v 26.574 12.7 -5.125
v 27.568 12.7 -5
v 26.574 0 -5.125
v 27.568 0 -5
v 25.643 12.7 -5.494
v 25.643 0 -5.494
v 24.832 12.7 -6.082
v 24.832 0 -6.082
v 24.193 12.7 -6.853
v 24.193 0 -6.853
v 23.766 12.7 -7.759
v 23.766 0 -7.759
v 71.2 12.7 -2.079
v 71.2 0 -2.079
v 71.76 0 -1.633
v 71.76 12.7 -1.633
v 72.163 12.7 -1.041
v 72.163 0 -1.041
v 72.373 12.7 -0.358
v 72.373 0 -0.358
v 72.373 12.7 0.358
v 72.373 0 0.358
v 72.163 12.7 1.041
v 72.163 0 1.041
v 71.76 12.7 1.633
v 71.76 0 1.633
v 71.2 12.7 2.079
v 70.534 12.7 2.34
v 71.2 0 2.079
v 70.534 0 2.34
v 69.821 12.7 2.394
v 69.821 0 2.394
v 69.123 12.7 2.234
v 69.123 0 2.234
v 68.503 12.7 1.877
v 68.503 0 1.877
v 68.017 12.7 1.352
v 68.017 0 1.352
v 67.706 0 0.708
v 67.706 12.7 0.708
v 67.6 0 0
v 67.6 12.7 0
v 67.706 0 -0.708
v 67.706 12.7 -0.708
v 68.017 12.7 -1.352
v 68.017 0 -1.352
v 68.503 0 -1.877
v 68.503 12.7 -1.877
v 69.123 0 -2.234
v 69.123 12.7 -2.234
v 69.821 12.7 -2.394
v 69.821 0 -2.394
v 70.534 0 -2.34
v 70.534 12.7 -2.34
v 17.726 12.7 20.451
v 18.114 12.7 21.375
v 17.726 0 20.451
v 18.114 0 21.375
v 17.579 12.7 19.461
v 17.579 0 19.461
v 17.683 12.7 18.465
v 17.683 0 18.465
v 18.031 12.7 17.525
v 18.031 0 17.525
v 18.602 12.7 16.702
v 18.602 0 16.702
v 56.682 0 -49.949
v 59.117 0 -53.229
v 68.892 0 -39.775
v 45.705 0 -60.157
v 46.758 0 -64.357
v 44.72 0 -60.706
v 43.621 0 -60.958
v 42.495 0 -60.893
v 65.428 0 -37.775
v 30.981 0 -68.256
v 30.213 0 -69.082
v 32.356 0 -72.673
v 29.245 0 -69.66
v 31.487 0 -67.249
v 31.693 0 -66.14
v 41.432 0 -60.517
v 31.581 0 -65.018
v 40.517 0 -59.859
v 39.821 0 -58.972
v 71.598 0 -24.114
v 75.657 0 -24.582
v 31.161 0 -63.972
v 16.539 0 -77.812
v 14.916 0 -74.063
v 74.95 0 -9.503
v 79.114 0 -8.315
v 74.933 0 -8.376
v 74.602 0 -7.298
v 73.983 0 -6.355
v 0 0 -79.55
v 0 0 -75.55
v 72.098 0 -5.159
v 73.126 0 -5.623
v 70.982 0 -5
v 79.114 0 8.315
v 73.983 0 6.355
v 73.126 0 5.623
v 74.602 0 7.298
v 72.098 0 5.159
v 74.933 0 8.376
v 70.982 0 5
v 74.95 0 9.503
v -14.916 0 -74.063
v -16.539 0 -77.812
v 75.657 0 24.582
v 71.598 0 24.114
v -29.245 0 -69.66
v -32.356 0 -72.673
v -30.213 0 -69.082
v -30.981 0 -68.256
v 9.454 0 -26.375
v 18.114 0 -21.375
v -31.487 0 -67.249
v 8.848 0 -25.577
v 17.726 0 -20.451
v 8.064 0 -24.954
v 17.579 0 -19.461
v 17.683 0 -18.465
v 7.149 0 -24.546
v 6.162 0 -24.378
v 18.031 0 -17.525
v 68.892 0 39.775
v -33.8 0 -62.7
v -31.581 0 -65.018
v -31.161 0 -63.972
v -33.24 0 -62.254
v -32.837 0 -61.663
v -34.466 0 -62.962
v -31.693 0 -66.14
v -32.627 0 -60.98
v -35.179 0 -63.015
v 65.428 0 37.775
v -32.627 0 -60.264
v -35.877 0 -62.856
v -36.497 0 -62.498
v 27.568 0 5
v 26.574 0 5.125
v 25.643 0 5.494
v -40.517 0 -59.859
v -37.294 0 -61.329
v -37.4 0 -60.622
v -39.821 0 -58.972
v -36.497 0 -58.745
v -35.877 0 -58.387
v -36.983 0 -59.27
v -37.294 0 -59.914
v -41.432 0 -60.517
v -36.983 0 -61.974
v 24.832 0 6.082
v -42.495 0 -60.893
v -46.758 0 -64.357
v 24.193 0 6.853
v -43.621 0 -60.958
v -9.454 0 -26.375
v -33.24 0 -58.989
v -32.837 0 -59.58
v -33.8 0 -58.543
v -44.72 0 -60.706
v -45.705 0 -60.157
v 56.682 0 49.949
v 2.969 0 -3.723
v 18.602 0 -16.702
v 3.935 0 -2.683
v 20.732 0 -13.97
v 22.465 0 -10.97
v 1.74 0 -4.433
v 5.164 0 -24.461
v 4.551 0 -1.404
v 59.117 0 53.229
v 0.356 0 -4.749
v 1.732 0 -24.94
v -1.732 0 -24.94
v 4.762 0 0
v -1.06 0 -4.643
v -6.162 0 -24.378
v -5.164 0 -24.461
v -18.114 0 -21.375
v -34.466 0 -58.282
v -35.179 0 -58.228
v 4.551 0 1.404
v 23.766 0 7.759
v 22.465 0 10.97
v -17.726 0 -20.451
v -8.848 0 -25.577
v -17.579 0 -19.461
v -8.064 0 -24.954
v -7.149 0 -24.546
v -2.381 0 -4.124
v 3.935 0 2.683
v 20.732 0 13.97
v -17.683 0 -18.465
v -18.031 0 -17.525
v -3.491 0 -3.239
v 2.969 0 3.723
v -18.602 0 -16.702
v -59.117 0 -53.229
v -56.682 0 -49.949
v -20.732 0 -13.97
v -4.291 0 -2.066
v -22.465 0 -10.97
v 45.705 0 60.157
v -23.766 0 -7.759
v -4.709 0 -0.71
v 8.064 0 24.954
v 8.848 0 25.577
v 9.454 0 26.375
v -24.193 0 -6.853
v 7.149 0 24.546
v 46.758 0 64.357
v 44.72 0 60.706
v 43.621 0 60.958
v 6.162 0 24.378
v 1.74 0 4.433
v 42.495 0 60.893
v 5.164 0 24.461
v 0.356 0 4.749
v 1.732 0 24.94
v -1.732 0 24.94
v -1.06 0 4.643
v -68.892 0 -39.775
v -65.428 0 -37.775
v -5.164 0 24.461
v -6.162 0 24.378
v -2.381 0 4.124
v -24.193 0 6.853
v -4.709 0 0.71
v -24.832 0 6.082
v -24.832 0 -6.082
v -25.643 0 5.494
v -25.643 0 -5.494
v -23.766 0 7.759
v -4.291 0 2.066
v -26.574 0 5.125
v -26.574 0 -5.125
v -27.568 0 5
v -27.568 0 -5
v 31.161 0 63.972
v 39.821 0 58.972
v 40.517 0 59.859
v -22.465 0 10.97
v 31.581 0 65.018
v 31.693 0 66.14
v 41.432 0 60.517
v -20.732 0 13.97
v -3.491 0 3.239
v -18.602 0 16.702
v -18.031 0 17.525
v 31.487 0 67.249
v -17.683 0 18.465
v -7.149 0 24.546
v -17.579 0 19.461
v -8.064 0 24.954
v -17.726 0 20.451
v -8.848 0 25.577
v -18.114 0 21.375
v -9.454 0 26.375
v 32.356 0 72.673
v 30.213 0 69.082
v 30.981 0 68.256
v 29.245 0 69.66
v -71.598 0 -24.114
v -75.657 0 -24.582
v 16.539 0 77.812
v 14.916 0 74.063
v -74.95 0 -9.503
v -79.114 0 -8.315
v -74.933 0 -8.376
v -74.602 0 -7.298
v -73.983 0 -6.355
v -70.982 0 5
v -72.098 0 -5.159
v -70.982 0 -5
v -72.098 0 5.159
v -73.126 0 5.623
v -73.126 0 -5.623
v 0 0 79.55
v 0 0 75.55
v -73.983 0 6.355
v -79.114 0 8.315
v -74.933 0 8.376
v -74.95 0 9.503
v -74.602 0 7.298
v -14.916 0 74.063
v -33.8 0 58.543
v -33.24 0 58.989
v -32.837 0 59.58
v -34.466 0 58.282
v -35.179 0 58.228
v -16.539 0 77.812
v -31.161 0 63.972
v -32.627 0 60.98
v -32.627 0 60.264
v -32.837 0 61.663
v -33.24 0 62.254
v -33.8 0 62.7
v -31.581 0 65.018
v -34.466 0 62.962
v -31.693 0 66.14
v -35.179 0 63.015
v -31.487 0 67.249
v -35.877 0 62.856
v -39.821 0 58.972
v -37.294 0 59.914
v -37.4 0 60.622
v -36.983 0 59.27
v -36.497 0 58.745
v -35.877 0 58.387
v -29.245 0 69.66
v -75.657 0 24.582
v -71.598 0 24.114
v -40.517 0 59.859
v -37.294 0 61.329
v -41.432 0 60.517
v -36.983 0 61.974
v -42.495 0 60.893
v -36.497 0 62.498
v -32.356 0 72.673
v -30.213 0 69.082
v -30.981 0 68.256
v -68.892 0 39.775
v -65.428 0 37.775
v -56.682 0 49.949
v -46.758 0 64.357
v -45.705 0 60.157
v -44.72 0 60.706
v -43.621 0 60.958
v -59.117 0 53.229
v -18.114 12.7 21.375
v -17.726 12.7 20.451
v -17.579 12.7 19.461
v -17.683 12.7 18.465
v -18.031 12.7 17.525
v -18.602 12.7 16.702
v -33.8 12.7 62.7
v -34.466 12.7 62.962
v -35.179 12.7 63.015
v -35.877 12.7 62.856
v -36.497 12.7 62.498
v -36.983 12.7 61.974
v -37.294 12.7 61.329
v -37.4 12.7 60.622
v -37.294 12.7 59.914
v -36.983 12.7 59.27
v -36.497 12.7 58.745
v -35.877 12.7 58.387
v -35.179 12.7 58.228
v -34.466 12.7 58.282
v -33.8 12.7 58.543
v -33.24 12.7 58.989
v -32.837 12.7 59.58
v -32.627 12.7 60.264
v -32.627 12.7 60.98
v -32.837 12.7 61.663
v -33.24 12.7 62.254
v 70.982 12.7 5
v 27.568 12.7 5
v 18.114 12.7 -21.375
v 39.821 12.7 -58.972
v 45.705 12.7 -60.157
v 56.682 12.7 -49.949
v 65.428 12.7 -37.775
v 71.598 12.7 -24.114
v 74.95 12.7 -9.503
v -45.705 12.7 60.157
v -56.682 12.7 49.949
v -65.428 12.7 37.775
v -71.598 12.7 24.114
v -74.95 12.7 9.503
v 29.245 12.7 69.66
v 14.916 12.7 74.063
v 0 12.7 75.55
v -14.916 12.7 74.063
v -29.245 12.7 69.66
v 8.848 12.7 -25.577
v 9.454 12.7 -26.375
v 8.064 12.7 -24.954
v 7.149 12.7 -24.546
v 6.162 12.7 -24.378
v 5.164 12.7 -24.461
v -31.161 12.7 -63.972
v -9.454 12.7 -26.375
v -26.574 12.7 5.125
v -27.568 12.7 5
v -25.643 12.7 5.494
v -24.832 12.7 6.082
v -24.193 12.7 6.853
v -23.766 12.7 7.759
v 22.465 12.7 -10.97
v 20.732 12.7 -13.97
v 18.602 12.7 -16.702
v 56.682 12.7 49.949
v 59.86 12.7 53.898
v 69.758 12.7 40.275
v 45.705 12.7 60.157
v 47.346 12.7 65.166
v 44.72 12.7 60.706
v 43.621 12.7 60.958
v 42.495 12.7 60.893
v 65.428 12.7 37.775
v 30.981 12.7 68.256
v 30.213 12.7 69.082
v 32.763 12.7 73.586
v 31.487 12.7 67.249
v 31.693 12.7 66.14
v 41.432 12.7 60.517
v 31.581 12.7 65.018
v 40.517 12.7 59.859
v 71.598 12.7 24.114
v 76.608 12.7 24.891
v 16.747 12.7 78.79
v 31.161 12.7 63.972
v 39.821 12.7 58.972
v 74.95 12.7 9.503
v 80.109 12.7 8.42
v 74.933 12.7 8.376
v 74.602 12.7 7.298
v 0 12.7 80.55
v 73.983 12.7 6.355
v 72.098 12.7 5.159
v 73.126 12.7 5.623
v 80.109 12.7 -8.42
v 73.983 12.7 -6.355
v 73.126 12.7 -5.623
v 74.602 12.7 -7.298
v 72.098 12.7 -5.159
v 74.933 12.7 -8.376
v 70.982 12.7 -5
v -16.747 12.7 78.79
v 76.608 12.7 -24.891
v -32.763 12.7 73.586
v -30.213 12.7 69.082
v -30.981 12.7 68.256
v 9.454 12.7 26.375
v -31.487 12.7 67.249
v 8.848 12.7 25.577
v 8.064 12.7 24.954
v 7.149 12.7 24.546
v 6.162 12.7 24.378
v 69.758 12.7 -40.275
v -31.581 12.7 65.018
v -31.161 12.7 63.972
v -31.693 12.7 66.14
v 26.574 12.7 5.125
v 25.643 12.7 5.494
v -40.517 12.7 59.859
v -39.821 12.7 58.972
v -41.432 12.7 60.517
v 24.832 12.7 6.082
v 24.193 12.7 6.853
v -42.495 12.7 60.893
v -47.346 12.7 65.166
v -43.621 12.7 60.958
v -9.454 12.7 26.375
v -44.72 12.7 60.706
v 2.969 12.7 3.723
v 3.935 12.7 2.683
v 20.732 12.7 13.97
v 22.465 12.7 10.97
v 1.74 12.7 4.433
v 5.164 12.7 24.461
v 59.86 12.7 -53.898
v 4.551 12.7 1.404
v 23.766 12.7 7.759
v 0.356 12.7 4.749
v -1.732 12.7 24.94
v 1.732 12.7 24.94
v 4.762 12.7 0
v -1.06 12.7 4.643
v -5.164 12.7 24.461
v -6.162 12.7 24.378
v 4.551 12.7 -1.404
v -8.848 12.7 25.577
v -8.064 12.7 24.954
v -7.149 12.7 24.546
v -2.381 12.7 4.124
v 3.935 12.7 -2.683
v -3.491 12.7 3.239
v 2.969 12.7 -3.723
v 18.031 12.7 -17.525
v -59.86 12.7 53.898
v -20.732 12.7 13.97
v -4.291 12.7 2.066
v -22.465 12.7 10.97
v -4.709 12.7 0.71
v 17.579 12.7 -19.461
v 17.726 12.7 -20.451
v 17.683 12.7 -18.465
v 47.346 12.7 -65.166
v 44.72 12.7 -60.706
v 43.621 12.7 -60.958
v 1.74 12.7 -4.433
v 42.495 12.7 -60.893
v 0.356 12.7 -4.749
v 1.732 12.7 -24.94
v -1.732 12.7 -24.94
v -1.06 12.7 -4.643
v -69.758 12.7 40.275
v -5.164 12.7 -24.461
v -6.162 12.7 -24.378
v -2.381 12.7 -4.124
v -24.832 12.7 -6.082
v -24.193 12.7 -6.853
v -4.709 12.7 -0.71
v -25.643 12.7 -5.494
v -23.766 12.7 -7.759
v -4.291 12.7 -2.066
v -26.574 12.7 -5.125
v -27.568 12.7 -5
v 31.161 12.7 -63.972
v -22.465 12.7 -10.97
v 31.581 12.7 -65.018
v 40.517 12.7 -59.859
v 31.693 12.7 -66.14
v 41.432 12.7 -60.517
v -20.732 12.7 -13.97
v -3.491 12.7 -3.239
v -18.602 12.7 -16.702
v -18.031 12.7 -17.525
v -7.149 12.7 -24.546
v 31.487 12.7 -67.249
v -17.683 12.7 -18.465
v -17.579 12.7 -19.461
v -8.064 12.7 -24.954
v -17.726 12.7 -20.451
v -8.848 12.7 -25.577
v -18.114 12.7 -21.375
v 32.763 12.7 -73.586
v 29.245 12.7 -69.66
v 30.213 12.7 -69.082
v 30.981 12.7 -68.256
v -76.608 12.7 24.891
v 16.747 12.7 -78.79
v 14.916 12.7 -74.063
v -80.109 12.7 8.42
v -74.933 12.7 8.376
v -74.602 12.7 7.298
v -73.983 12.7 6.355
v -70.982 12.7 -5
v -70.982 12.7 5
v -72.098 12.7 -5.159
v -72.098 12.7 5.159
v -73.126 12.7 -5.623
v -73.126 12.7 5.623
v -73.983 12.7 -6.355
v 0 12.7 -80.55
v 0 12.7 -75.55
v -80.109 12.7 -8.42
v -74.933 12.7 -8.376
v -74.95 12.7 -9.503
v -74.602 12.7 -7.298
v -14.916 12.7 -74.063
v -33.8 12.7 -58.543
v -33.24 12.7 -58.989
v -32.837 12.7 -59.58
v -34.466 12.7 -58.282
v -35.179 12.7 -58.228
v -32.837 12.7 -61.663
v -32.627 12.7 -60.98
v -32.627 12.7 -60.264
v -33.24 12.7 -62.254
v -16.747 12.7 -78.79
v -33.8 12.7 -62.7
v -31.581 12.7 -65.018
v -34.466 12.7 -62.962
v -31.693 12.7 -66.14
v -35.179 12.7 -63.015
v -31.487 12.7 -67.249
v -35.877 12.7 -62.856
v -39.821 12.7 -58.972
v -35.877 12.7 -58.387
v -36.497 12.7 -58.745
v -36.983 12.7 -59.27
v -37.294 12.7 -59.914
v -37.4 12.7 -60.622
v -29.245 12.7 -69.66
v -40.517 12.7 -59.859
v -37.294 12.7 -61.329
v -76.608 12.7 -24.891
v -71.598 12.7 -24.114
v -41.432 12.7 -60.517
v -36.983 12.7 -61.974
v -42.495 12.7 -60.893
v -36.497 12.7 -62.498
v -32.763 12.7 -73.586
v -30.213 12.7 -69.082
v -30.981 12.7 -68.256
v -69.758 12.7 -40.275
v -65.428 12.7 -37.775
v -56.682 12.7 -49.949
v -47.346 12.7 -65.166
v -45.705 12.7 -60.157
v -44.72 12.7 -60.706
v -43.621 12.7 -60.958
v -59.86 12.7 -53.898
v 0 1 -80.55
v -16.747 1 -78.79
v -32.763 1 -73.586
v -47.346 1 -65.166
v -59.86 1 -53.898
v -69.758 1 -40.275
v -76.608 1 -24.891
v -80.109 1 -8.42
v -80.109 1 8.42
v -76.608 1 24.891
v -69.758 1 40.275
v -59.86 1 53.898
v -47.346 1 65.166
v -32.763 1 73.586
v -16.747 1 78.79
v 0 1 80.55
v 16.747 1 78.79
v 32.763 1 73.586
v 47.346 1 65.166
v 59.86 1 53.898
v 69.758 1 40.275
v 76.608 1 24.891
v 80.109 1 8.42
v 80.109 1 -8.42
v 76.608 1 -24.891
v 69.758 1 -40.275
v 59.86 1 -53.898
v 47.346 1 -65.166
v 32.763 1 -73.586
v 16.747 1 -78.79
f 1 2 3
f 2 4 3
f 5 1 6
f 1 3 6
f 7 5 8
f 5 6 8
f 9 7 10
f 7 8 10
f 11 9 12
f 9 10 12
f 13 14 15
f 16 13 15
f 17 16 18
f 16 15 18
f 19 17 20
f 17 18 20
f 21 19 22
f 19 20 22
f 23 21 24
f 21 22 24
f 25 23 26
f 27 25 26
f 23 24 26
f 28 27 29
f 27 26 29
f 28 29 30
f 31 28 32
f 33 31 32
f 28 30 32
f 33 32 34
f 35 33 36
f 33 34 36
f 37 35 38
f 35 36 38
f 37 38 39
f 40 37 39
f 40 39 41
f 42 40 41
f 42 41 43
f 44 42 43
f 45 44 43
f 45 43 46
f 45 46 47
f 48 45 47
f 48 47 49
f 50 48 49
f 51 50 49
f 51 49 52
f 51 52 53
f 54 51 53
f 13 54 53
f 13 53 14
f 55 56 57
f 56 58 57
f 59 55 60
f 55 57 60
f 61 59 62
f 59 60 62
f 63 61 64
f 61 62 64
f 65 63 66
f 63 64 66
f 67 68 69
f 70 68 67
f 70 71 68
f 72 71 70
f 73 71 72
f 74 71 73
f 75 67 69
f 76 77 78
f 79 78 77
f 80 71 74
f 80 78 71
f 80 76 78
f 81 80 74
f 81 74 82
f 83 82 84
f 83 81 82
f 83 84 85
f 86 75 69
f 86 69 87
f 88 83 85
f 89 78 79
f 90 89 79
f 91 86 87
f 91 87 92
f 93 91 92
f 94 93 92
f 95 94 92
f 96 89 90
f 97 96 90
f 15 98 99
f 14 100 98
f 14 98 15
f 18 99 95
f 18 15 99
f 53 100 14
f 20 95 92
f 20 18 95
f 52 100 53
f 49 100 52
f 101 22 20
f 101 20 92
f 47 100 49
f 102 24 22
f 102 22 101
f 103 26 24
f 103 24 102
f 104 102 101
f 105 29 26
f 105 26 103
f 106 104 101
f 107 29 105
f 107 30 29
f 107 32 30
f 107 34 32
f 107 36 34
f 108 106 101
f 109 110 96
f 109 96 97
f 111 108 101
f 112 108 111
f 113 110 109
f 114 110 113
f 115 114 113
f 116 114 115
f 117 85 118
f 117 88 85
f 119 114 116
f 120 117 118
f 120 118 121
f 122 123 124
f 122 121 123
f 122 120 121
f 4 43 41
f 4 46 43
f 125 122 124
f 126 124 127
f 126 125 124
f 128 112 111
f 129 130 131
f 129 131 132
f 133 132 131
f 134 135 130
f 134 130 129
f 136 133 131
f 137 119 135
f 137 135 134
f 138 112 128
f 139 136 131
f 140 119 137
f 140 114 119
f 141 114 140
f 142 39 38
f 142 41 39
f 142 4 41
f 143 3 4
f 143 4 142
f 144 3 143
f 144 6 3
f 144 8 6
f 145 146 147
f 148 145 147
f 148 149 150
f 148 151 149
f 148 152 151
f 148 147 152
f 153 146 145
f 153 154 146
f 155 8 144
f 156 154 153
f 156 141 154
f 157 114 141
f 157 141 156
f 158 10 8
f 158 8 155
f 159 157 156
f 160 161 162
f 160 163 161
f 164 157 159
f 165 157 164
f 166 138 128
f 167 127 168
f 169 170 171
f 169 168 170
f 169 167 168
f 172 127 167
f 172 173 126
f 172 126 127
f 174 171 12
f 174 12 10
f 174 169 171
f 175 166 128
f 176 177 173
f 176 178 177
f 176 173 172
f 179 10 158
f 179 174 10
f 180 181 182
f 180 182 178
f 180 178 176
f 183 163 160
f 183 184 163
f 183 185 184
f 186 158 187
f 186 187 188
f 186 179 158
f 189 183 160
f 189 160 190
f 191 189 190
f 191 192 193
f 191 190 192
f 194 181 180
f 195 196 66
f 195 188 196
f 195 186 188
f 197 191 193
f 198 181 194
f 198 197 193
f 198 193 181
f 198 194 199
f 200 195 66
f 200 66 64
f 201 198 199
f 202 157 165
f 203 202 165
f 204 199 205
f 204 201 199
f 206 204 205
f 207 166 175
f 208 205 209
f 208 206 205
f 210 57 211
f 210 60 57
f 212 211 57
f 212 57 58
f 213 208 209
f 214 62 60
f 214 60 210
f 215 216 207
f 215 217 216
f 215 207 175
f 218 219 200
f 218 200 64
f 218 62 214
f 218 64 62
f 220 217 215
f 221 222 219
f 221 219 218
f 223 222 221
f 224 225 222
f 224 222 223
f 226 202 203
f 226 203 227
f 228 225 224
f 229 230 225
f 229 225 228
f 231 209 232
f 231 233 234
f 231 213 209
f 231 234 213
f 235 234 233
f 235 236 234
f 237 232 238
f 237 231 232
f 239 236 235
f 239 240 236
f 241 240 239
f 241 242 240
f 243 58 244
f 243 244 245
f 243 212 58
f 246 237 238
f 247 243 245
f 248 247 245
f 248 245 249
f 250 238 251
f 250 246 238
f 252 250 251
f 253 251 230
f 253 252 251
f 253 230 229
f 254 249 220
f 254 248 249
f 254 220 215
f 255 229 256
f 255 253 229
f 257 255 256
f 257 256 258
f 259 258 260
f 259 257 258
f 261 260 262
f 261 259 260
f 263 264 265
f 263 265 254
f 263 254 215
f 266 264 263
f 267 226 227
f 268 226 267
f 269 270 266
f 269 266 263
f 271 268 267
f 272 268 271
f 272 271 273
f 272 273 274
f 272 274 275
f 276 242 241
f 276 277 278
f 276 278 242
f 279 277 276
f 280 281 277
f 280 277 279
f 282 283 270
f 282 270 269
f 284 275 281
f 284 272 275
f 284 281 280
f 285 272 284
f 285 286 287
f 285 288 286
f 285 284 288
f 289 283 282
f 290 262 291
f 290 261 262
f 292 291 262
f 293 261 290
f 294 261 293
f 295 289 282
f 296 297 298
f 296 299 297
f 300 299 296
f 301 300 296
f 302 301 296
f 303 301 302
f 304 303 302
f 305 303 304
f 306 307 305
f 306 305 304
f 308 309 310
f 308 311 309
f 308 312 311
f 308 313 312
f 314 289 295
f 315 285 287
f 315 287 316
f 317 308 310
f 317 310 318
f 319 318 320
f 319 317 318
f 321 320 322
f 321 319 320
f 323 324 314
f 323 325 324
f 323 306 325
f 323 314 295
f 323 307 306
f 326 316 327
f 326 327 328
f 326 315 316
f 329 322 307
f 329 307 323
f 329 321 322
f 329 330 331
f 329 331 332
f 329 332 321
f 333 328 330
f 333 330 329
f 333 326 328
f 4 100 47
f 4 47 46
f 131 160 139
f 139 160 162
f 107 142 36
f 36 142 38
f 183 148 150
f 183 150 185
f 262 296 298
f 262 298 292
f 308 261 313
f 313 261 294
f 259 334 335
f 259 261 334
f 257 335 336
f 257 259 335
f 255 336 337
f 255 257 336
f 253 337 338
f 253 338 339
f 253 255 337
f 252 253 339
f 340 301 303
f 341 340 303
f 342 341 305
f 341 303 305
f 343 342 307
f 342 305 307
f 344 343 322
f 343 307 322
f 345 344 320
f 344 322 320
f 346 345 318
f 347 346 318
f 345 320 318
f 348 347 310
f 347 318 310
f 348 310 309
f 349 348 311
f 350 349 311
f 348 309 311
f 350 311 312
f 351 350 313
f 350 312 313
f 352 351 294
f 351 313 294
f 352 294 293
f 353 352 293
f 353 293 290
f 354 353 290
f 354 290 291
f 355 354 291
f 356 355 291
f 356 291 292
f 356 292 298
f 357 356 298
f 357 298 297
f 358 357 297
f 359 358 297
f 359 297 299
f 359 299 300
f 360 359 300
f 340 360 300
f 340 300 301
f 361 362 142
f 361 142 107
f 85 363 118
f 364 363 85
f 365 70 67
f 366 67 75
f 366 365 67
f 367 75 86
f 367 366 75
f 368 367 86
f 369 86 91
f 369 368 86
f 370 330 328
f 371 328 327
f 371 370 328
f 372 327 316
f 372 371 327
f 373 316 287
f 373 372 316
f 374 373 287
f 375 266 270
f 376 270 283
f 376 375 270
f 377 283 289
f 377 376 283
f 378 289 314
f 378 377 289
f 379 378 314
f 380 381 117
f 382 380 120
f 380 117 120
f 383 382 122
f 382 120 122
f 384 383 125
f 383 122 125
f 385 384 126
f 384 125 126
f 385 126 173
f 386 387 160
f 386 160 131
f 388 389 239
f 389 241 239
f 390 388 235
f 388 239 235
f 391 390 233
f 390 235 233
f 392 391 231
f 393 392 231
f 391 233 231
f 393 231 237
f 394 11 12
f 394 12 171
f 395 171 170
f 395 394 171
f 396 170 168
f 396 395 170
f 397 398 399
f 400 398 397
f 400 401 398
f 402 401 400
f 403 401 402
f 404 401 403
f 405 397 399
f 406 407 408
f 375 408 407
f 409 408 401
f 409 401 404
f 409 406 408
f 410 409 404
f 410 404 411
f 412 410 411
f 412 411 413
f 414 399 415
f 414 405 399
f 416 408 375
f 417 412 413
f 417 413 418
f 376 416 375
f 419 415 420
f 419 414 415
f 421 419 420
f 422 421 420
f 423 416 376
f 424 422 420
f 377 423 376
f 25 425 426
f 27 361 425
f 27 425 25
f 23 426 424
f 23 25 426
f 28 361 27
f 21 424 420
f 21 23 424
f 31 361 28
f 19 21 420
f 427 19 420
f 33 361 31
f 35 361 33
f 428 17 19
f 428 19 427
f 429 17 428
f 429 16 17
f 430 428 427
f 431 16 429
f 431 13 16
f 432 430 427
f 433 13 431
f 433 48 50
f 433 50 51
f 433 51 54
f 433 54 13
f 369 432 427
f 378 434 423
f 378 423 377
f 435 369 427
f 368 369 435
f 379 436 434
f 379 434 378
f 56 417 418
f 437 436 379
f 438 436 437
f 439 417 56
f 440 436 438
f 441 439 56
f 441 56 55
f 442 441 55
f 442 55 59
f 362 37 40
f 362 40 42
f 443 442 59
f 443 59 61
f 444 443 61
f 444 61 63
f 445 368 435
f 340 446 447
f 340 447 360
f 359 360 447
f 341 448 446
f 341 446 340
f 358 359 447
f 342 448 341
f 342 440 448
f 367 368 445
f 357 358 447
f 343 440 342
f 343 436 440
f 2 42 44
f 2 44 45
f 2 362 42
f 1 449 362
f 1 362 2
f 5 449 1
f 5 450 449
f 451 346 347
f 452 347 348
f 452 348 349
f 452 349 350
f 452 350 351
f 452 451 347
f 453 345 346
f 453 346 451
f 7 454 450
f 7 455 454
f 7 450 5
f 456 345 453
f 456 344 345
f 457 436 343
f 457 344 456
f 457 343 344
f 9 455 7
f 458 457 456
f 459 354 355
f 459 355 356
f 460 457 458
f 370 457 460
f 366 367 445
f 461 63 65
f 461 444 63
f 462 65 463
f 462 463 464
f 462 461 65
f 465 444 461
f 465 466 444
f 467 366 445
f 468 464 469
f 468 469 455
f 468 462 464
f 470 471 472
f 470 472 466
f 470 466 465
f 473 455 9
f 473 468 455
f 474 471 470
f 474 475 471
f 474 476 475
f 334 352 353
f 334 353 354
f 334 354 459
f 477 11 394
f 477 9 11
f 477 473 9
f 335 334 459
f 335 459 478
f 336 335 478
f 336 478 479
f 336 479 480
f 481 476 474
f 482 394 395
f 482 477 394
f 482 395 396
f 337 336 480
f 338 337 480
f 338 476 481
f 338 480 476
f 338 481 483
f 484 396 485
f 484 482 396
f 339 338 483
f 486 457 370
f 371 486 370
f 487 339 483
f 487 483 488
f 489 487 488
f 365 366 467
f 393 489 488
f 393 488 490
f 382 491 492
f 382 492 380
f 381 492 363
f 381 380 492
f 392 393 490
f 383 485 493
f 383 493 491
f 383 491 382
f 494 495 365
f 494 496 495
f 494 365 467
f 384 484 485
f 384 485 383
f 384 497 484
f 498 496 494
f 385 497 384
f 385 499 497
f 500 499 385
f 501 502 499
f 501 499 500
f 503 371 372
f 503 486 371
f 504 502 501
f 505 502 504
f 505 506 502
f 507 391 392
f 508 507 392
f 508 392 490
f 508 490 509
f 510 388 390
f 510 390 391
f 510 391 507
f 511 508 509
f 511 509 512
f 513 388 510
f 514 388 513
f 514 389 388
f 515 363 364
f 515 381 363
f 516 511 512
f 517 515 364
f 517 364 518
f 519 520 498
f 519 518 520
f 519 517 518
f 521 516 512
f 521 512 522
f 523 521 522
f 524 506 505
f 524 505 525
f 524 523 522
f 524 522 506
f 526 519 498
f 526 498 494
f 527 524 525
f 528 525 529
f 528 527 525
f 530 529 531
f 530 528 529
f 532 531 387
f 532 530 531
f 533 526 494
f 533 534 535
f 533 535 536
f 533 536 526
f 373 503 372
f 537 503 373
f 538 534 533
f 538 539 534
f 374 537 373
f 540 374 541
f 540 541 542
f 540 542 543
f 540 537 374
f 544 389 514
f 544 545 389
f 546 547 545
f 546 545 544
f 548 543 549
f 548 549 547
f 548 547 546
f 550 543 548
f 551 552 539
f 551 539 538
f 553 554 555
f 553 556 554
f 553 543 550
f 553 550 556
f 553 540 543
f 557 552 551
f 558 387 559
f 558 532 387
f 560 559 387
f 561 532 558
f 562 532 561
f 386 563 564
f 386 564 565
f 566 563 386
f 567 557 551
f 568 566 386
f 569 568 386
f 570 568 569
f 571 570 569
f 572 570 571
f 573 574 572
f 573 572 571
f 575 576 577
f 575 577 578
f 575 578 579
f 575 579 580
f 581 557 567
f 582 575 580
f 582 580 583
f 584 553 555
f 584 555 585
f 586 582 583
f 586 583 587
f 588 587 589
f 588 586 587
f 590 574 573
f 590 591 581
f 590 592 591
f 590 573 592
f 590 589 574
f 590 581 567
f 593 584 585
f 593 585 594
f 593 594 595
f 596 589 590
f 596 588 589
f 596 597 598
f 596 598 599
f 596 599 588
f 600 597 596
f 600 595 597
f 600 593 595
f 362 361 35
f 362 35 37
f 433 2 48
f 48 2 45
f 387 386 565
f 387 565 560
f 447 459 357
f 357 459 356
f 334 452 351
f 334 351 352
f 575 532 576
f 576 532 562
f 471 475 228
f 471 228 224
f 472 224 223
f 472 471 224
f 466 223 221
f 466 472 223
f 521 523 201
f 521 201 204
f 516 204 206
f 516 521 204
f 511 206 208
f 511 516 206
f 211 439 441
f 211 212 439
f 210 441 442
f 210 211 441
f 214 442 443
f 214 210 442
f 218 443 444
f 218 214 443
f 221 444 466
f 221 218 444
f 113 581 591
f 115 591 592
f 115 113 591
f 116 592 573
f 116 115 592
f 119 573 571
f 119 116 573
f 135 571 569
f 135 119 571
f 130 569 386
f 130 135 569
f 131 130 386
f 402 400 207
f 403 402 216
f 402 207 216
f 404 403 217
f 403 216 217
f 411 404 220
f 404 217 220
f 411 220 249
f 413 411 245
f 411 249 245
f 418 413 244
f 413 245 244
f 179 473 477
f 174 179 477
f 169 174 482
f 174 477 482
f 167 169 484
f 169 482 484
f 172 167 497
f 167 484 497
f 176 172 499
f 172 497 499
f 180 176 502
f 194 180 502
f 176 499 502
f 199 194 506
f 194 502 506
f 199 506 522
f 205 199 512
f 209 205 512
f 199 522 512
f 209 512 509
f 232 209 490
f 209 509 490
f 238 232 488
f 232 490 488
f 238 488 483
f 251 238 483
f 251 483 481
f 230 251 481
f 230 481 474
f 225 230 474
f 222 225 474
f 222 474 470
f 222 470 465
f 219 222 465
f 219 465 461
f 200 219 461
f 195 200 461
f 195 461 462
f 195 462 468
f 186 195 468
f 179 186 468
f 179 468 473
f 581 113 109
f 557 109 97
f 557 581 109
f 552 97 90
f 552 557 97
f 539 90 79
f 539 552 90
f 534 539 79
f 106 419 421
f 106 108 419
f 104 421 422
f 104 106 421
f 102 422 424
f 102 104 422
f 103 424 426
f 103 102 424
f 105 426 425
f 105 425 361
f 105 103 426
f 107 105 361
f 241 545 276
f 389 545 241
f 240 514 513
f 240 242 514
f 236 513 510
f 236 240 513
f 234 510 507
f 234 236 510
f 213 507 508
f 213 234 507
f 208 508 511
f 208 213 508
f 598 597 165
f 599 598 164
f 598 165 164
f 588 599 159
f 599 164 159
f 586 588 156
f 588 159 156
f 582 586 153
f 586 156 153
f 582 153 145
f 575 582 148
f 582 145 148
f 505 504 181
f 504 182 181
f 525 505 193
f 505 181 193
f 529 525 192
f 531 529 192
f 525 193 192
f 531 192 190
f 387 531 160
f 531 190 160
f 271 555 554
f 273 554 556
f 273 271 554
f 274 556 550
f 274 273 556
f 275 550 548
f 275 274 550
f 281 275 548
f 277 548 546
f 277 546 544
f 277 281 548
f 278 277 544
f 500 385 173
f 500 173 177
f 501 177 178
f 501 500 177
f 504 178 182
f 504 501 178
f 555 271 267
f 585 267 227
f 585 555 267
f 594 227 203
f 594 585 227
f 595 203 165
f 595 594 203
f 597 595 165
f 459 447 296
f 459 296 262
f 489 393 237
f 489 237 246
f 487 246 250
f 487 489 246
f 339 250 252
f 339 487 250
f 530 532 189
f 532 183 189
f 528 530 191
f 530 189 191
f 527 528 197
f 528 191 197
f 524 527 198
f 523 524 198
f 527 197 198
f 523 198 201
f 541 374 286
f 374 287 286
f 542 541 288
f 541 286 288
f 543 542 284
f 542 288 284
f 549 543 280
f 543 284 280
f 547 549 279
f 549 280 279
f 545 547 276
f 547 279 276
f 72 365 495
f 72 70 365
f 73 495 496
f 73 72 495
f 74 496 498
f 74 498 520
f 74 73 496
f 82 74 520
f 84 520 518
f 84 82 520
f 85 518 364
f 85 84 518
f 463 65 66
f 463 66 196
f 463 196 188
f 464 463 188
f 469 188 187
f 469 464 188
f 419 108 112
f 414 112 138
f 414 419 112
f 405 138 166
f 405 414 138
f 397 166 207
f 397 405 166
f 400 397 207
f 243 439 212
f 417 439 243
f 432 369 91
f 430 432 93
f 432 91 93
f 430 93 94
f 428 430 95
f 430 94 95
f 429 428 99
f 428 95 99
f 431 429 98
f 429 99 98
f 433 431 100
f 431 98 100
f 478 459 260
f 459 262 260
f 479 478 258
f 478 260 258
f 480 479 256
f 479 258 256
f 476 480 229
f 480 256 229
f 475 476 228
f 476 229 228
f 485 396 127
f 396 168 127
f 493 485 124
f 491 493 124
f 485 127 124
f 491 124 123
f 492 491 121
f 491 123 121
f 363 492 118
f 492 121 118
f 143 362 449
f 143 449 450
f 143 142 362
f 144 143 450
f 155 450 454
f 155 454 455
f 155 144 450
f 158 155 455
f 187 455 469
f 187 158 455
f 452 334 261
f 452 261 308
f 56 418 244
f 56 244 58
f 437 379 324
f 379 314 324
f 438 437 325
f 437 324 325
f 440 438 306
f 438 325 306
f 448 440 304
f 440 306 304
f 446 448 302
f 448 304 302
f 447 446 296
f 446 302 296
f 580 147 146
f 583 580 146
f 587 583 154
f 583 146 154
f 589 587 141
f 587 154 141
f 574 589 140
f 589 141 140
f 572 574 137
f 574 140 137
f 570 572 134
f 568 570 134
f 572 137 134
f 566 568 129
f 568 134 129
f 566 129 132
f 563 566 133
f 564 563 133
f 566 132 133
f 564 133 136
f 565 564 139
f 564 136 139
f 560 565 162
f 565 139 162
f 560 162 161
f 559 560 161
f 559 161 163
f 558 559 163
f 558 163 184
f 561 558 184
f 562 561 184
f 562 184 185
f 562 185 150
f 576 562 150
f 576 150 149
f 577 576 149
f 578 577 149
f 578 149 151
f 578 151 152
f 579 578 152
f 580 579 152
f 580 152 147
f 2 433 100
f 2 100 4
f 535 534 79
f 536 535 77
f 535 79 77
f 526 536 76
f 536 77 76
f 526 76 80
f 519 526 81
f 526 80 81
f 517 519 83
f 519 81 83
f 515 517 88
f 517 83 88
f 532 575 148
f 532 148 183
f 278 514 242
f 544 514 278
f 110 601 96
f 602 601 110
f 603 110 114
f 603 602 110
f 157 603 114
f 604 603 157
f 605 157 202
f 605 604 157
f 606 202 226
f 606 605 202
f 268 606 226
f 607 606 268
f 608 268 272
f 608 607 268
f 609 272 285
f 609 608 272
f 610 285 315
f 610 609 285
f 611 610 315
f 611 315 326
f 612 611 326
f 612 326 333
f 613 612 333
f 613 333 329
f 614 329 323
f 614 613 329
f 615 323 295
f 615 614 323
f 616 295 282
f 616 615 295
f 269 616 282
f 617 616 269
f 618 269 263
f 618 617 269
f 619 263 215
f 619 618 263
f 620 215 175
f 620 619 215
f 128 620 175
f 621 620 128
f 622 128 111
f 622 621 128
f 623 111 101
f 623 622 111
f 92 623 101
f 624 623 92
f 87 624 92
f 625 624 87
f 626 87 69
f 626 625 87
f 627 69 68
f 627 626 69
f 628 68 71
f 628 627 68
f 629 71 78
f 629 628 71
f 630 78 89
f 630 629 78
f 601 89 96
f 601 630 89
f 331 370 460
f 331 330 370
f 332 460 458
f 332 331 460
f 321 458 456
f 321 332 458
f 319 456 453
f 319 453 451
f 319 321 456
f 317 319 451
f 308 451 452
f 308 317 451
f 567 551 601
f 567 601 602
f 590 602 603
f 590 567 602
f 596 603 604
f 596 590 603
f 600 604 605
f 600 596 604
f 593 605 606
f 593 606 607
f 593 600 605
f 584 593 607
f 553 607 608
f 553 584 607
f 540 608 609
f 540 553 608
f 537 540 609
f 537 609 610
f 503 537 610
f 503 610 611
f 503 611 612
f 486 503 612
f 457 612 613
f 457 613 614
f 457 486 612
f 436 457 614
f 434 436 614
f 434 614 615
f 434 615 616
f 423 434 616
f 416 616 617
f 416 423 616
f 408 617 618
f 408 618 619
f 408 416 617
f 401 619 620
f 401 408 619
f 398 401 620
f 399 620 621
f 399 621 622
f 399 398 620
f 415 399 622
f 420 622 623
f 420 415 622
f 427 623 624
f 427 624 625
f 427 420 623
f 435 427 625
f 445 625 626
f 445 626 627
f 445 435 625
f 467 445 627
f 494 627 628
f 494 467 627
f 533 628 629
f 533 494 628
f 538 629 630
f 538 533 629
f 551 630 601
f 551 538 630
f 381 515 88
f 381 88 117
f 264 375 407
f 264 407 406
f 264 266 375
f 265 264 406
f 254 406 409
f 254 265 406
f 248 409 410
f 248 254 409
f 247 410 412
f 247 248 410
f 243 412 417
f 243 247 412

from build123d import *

# Parameters (mm, degrees)
F_12_0_189_DIAMETER_HOLE1_D  = 4.8006
CIRPATTERN3_COUNT            = 3
CUT_EXTRUDE1_DEPTH           = 115.6206569515286
FILLET1_R                    = 4
CIRPATTERN4_COUNT            = 6
FILLET1_OF_CIRPATTERN4_R     = 4
CHAMFER2_SIZE                = 1
F_3_8_0_375_DIAMETER_HOLE1_D = 9.525


with BuildPart() as part:
    # Sketch2 → Revolve1 (revolve)
    with BuildSketch(Plane(origin=(0, 0, 0), x_dir=(0, 0, -1), z_dir=(1, 0, 0)), mode=Mode.PRIVATE) as revolve1_sk:
        Polygon((0, 0), (-80.55, -9.86e-15), (-80.55, 12.699999999999989), (0, 12.699999999999989), align=None)
    revolve(revolve1_sk.sketch.rotate(Axis((0, -0.6350000000000106, 0), (0, 1, 0)), 180), axis=Axis((0, -0.6350000000000106, 0), (0, 1, 0)))

    # #12 (0.189) Diameter Hole1 (through all)
    with Locations(Plane(origin=(0, 12.699999999999989, 0), x_dir=(1, 0, 0), z_dir=(0, 1, 0))):
        with Locations((-35, 60.621778265)):
            f_12_0_189_diameter_hole1 = Hole(F_12_0_189_DIAMETER_HOLE1_D / 2)

    # CirPattern3: #12 (0.189) Diameter Hole1 ×3 about axis
    cirpattern3_axis = Axis((2.7e-16, 0, 4.47e-15), (0, 1, 0))
    for i in range(1, CIRPATTERN3_COUNT):
        add(f_12_0_189_diameter_hole1.rotate(cirpattern3_axis, i * 360 / CIRPATTERN3_COUNT), mode=Mode.SUBTRACT)

    # Sketch8 → Cut-Extrude1 (cut, through all)
    with BuildSketch(Plane(origin=(0, 12.699999999999989, 0), x_dir=(1, 0, 0), z_dir=(0, 1, 0))):
        with BuildLine():
            Line((-7.91732169499373, 23.713203435596423), (-33.36205552600357, 67.784775215972))
            ThreePointArc((-33.36205552600357, 67.784775215972), (4.63e-15, 75.54999999999998), (33.36205552600357, 67.784775215972))
            Line((33.36205552600357, 67.784775215972), (7.917321694993729, 23.713203435596423))
            ThreePointArc((7.917321694993729, 23.713203435596423), (1.53e-15, 25.000000000000007), (-7.91732169499373, 23.713203435596423))
        make_face()
    cut_extrude1 = extrude(amount=-CUT_EXTRUDE1_DEPTH, mode=Mode.SUBTRACT)

    # Fillet1
    fillet1_edges = [part.edges().sort_by_distance(p)[0] for p in [
        (7.9173216949937295, 6.349999999999994, -23.713203435596427),
        (-7.9173216949937295, 6.349999999999994, -23.713203435596427),
        (-33.36205552600357, 6.349999999999994, -67.78477521597199),
        (33.36205552600358, 6.349999999999994, -67.78477521597199),
    ]]
    fillet(fillet1_edges, radius=FILLET1_R)

    # CirPattern4: Cut-Extrude1 ×6 about axis
    cirpattern4_axis = Axis((-3.068e-14, 0, 1.3e-16), (0, 1, 0))
    for i in range(1, CIRPATTERN4_COUNT):
        add(cut_extrude1.rotate(cirpattern4_axis, i * 360 / CIRPATTERN4_COUNT), mode=Mode.SUBTRACT)

    # Fillet1 of CirPattern4
    fillet1_of_cirpattern4_edges = [part.edges().sort_by_distance(p)[0] for p in [
        (-16.57757573283808, 6.349999999999994, -18.71320343559648),
        (-24.494897427831813, 6.349999999999994, -5.000000000000001),
        (-75.38436508985136, 6.349999999999994, -4.999999999999924),
        (-42.02230956384777, 6.349999999999994, -62.78477521597215),
        (-24.49489742783184, 6.349999999999994, 4.99999999999994),
        (-16.577575732838117, 6.349999999999994, 18.713203435596423),
        (-42.02230956384782, 6.349999999999994, 62.78477521597206),
        (-75.38436508985139, 6.349999999999994, 4.999999999999838),
        (-7.9173216949937935, 6.349999999999994, 23.713203435596427),
        (7.917321694993666, 6.349999999999994, 23.713203435596427),
        (33.3620555260035, 6.349999999999994, 67.78477521597199),
        (-33.36205552600365, 6.349999999999994, 67.78477521597199),
        (16.57757573283801, 6.349999999999994, 18.71320343559649),
        (24.49489742783175, 6.349999999999994, 5.0000000000000115),
        (75.3843650898513, 6.349999999999994, 4.999999999999952),
        (42.022309563847685, 6.349999999999994, 62.78477521597216),
        (24.494897427831784, 6.349999999999994, -4.999999999999948),
        (16.577575732838053, 6.349999999999994, -18.71320343559643),
        (42.02230956384774, 6.349999999999994, -62.784775215972076),
        (75.38436508985133, 6.349999999999994, -4.999999999999863),
    ]]
    fillet(fillet1_of_cirpattern4_edges, radius=FILLET1_OF_CIRPATTERN4_R)

    # Chamfer2
    chamfer2_edges = [part.edges().sort_by_distance(p)[0] for p in [
        (-1.973e-14, -9.88e-15, 80.55),
    ]]
    chamfer(chamfer2_edges, length=CHAMFER2_SIZE)

    # 3/8 (0.375) Diameter Hole1 (through all)
    with Locations(Plane(origin=(0, 0, 0), x_dir=(-1, 0, 0), z_dir=(0, -1, 0))):
        with Locations((0, 0)):
            Hole(F_3_8_0_375_DIAMETER_HOLE1_D / 2)


solid = part.part
